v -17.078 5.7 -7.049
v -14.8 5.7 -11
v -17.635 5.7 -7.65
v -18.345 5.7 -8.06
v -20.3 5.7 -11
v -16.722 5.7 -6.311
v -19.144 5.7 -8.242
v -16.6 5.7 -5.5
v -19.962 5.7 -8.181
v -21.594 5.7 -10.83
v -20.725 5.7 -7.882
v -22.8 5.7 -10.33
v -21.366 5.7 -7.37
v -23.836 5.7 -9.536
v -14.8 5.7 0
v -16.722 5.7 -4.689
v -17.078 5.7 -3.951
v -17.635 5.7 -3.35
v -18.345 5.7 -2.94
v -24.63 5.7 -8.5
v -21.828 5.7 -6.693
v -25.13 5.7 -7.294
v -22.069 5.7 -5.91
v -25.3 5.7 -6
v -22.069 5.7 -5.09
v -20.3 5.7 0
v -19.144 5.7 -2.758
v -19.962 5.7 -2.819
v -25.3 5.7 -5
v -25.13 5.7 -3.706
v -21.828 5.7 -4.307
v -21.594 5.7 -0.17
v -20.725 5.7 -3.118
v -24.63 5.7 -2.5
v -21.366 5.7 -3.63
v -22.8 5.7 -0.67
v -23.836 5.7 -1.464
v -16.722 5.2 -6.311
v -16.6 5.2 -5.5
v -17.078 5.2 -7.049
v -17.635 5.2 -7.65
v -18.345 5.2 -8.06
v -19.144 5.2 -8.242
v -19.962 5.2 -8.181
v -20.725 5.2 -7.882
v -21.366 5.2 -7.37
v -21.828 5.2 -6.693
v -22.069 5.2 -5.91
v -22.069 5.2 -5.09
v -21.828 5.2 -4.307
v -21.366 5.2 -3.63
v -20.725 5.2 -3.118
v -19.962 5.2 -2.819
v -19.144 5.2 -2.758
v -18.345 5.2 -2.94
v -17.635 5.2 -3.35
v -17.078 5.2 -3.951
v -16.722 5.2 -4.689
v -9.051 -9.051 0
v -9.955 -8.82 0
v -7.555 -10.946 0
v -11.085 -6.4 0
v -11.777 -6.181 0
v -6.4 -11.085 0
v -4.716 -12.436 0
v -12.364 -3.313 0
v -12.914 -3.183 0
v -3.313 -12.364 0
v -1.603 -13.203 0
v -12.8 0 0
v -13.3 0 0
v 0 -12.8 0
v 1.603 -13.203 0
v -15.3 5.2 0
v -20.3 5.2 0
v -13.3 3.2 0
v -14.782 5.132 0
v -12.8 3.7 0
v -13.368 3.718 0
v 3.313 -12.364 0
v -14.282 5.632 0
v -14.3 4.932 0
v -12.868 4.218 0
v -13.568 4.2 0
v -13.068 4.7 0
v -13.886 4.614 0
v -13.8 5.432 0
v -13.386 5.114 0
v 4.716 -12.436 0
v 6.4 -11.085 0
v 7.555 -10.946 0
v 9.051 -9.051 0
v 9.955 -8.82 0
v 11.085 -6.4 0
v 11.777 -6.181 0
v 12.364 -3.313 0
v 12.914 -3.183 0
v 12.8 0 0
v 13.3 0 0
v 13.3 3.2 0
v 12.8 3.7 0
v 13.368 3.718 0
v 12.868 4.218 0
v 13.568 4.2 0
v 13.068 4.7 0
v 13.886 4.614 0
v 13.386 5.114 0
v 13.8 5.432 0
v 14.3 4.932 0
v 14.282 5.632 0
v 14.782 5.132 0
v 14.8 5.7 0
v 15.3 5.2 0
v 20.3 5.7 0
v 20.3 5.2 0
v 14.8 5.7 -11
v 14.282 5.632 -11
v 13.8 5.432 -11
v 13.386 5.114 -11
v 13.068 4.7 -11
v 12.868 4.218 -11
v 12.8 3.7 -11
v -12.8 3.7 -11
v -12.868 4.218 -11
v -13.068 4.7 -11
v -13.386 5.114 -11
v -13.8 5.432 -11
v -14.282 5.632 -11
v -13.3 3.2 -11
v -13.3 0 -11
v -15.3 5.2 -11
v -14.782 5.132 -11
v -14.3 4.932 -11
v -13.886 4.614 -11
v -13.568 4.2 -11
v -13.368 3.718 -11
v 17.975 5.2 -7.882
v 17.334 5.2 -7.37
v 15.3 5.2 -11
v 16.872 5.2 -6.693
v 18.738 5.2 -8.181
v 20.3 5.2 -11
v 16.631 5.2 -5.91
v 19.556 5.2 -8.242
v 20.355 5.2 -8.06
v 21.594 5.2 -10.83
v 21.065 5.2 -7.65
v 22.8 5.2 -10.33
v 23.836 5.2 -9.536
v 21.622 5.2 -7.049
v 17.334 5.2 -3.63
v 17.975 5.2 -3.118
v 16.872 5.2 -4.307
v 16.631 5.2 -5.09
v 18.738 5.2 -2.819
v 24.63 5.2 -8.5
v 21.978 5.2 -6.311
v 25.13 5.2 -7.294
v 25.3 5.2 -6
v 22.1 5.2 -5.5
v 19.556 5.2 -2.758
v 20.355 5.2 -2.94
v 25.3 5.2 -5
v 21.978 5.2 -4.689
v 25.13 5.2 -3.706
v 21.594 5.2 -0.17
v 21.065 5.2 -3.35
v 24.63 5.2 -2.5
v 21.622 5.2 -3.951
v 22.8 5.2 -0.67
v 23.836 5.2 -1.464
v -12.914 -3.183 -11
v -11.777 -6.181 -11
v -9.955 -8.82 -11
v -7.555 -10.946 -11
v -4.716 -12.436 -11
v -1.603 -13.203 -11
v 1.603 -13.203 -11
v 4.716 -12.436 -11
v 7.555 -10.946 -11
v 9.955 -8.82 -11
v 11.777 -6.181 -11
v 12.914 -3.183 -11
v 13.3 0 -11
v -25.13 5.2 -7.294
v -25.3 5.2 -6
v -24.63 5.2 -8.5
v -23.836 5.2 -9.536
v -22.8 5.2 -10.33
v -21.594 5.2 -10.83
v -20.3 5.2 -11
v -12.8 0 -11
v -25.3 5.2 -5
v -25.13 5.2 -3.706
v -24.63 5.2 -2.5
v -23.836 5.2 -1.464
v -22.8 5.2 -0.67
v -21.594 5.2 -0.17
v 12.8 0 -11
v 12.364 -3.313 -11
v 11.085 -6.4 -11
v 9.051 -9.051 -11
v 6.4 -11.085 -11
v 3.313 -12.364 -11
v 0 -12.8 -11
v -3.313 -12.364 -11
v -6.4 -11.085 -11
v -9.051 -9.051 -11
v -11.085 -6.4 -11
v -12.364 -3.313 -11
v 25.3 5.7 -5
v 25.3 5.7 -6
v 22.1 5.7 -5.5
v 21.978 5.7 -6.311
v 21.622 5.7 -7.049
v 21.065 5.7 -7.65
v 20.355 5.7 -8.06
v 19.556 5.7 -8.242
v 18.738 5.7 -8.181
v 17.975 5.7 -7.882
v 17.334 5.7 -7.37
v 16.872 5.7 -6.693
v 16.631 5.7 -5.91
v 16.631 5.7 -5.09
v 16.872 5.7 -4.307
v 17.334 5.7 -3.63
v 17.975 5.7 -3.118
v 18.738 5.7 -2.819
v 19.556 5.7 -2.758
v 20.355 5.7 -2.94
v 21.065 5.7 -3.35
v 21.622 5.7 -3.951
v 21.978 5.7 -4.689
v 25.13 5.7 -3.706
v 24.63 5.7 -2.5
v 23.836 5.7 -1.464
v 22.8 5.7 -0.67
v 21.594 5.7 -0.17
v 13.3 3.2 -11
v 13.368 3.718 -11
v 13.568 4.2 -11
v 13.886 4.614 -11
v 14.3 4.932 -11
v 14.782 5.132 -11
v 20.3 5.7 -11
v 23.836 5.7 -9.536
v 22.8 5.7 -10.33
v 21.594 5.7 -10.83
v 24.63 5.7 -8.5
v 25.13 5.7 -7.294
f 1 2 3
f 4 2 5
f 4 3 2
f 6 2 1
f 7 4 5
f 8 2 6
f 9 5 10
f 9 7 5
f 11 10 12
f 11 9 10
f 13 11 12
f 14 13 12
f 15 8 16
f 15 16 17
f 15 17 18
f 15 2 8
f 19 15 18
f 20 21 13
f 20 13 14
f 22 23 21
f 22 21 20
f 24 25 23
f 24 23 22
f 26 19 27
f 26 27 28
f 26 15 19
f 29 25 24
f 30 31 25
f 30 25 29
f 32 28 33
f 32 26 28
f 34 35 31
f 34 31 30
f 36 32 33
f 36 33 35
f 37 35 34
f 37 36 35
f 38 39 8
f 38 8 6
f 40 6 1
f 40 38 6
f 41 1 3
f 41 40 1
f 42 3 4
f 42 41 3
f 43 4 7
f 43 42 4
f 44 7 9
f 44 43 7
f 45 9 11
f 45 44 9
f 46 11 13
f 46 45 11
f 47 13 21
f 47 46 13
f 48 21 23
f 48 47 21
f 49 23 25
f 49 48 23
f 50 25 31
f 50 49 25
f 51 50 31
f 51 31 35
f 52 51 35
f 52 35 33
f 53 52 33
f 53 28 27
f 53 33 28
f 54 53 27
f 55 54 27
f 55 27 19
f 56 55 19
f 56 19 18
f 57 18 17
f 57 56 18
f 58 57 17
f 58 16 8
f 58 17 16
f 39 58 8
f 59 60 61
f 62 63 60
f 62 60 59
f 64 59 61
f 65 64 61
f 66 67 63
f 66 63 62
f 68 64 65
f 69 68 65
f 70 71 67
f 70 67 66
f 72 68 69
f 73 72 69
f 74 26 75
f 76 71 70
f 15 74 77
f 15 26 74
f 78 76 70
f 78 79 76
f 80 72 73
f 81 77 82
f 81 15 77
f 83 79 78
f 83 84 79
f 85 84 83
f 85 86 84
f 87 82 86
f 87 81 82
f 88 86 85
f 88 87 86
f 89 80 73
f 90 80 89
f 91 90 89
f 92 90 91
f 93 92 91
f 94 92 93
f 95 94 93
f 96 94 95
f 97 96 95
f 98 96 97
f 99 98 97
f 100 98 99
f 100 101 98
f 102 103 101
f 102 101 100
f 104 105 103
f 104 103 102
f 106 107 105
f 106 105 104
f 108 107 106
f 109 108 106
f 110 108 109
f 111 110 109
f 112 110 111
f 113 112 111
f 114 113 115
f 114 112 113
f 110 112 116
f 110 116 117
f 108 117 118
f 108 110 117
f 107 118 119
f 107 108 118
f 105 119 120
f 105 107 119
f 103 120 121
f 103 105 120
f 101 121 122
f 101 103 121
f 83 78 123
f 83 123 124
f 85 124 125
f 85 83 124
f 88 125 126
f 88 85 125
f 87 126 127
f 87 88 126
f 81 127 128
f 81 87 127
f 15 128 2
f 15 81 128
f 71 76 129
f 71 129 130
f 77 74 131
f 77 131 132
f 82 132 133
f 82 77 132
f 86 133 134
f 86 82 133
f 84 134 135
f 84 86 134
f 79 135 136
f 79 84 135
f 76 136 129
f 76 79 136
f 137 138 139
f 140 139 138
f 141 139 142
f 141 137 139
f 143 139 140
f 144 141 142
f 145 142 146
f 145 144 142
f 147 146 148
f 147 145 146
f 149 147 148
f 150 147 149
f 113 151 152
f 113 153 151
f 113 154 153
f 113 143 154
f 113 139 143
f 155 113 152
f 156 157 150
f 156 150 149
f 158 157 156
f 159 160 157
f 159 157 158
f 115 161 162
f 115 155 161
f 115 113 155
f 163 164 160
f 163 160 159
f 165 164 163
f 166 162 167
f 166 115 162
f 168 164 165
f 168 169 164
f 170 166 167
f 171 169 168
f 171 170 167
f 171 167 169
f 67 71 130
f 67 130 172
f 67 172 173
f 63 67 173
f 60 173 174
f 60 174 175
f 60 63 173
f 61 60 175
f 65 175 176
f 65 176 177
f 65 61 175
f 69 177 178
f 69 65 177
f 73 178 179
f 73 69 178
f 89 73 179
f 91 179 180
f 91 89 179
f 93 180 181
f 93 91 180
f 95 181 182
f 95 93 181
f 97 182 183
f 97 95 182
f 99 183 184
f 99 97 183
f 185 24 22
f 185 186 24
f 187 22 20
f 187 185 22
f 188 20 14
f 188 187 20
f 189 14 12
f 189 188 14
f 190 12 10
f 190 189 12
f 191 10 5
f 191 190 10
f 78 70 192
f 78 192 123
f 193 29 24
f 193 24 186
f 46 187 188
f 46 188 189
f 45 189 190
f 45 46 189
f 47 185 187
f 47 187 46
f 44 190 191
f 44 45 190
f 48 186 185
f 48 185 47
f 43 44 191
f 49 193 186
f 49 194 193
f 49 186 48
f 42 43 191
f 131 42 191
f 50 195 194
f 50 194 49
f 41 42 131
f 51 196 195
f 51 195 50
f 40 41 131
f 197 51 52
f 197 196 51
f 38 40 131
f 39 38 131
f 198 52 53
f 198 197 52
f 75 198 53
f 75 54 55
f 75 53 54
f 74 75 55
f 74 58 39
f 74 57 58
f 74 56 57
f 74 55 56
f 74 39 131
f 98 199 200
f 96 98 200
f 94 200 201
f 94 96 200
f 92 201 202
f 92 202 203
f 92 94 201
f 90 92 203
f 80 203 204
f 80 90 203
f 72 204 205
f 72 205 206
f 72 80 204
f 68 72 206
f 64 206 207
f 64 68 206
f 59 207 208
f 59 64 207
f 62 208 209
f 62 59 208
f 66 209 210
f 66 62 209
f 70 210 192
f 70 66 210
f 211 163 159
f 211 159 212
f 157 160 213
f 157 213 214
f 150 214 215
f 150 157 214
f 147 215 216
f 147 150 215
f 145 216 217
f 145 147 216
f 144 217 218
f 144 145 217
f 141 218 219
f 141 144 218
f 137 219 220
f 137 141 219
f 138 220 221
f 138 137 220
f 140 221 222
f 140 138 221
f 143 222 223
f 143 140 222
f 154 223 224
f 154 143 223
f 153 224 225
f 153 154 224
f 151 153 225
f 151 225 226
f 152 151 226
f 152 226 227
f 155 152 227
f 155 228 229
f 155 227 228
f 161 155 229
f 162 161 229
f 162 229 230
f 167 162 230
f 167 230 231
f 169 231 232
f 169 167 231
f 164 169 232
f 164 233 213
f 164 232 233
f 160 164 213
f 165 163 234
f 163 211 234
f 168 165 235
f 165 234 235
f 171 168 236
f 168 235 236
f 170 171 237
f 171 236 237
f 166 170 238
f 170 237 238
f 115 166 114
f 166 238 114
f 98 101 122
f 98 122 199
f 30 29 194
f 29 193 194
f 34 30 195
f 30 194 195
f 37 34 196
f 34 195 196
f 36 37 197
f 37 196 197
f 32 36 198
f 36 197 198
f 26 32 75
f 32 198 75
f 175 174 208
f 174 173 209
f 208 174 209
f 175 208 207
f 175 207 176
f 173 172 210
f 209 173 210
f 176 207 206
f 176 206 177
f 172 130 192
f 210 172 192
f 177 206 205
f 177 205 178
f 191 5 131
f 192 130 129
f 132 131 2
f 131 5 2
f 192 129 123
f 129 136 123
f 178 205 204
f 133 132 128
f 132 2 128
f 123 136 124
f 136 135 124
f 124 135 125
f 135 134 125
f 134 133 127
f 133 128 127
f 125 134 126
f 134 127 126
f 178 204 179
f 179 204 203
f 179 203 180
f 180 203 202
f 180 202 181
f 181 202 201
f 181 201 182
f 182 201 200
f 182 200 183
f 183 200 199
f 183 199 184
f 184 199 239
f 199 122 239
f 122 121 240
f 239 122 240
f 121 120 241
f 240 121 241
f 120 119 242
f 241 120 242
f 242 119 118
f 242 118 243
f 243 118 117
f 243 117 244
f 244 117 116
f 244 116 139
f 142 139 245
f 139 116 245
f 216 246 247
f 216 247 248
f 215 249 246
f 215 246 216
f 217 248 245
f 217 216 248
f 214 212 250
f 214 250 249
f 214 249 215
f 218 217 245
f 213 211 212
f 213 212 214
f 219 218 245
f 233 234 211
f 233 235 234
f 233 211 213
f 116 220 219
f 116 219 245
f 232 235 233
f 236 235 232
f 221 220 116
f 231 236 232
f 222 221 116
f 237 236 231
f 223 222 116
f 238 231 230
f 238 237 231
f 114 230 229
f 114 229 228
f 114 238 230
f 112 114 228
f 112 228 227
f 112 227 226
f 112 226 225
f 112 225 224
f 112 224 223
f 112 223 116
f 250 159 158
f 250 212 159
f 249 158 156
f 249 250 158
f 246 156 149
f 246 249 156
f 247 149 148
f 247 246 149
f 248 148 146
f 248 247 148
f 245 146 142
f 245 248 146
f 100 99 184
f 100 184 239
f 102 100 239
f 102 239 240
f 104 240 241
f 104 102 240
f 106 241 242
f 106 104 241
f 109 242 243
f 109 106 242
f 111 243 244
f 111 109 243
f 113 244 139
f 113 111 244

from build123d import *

# Parameters (mm, degrees)
BASE_FLANGE1_DEPTH = 11
FILLET1_R          = 5
SKETCH6_R          = 2.75
CUT_EXTRUDE1_DEPTH = 10


# Sheet-metal steps are written as plain solids
with BuildPart() as part:
    # Sketch1 → Base-Flange1 (new body)
    with BuildSketch(Plane.XY):
        with BuildLine():
            Line((-12.8, 0), (-12.8, 3.7))
            ThreePointArc((-12.8, 3.7), (-13.385786438, 5.114213562), (-14.8, 5.7))
            Line((-14.8, 5.7), (-25.3, 5.7))
            Line((-25.3, 5.7), (-25.3, 5.2))
            Line((-25.3, 5.2), (-15.3, 5.2))
            ThreePointArc((-15.3, 5.2), (-13.885786438, 4.614213562), (-13.3, 3.2))
            Line((-13.3, 3.2), (-13.3, 0))
            ThreePointArc((-13.3, 0), (0, -13.3), (13.3, 0))
            Line((13.3, 0), (13.3, 3.2))
            ThreePointArc((13.3, 3.2), (13.885786438, 4.614213562), (15.3, 5.2))
            Line((15.3, 5.2), (25.3, 5.2))
            Line((25.3, 5.2), (25.3, 5.7))
            Line((25.3, 5.7), (14.8, 5.7))
            ThreePointArc((14.8, 5.7), (13.385786438, 5.114213562), (12.8, 3.7))
            Line((12.8, 3.7), (12.8, 0))
            ThreePointArc((12.8, 0), (0, -12.8), (-12.8, 0))
        make_face()
    extrude(amount=-BASE_FLANGE1_DEPTH)

    # Fillet1
    fillet1_edges = [part.edges().sort_by_distance(p)[0] for p in [
        (25.3, 5.45, 0),
        (-25.3, 5.45, 0),
        (-25.3, 5.45, -11),
        (25.3, 5.45, -11),
    ]]
    fillet(fillet1_edges, radius=FILLET1_R)

    # Sketch6 → Cut-Extrude1 (cut)
    with BuildSketch(Plane(origin=(0, 0, 0), x_dir=(1, 0, 0), z_dir=(0, 1, 0))):
        with Locations((19.35, 5.5)):
            Circle(SKETCH6_R)
        with Locations((-19.35, 5.5)):
            Circle(SKETCH6_R)
    extrude(amount=CUT_EXTRUDE1_DEPTH, mode=Mode.SUBTRACT)


solid = part.part
